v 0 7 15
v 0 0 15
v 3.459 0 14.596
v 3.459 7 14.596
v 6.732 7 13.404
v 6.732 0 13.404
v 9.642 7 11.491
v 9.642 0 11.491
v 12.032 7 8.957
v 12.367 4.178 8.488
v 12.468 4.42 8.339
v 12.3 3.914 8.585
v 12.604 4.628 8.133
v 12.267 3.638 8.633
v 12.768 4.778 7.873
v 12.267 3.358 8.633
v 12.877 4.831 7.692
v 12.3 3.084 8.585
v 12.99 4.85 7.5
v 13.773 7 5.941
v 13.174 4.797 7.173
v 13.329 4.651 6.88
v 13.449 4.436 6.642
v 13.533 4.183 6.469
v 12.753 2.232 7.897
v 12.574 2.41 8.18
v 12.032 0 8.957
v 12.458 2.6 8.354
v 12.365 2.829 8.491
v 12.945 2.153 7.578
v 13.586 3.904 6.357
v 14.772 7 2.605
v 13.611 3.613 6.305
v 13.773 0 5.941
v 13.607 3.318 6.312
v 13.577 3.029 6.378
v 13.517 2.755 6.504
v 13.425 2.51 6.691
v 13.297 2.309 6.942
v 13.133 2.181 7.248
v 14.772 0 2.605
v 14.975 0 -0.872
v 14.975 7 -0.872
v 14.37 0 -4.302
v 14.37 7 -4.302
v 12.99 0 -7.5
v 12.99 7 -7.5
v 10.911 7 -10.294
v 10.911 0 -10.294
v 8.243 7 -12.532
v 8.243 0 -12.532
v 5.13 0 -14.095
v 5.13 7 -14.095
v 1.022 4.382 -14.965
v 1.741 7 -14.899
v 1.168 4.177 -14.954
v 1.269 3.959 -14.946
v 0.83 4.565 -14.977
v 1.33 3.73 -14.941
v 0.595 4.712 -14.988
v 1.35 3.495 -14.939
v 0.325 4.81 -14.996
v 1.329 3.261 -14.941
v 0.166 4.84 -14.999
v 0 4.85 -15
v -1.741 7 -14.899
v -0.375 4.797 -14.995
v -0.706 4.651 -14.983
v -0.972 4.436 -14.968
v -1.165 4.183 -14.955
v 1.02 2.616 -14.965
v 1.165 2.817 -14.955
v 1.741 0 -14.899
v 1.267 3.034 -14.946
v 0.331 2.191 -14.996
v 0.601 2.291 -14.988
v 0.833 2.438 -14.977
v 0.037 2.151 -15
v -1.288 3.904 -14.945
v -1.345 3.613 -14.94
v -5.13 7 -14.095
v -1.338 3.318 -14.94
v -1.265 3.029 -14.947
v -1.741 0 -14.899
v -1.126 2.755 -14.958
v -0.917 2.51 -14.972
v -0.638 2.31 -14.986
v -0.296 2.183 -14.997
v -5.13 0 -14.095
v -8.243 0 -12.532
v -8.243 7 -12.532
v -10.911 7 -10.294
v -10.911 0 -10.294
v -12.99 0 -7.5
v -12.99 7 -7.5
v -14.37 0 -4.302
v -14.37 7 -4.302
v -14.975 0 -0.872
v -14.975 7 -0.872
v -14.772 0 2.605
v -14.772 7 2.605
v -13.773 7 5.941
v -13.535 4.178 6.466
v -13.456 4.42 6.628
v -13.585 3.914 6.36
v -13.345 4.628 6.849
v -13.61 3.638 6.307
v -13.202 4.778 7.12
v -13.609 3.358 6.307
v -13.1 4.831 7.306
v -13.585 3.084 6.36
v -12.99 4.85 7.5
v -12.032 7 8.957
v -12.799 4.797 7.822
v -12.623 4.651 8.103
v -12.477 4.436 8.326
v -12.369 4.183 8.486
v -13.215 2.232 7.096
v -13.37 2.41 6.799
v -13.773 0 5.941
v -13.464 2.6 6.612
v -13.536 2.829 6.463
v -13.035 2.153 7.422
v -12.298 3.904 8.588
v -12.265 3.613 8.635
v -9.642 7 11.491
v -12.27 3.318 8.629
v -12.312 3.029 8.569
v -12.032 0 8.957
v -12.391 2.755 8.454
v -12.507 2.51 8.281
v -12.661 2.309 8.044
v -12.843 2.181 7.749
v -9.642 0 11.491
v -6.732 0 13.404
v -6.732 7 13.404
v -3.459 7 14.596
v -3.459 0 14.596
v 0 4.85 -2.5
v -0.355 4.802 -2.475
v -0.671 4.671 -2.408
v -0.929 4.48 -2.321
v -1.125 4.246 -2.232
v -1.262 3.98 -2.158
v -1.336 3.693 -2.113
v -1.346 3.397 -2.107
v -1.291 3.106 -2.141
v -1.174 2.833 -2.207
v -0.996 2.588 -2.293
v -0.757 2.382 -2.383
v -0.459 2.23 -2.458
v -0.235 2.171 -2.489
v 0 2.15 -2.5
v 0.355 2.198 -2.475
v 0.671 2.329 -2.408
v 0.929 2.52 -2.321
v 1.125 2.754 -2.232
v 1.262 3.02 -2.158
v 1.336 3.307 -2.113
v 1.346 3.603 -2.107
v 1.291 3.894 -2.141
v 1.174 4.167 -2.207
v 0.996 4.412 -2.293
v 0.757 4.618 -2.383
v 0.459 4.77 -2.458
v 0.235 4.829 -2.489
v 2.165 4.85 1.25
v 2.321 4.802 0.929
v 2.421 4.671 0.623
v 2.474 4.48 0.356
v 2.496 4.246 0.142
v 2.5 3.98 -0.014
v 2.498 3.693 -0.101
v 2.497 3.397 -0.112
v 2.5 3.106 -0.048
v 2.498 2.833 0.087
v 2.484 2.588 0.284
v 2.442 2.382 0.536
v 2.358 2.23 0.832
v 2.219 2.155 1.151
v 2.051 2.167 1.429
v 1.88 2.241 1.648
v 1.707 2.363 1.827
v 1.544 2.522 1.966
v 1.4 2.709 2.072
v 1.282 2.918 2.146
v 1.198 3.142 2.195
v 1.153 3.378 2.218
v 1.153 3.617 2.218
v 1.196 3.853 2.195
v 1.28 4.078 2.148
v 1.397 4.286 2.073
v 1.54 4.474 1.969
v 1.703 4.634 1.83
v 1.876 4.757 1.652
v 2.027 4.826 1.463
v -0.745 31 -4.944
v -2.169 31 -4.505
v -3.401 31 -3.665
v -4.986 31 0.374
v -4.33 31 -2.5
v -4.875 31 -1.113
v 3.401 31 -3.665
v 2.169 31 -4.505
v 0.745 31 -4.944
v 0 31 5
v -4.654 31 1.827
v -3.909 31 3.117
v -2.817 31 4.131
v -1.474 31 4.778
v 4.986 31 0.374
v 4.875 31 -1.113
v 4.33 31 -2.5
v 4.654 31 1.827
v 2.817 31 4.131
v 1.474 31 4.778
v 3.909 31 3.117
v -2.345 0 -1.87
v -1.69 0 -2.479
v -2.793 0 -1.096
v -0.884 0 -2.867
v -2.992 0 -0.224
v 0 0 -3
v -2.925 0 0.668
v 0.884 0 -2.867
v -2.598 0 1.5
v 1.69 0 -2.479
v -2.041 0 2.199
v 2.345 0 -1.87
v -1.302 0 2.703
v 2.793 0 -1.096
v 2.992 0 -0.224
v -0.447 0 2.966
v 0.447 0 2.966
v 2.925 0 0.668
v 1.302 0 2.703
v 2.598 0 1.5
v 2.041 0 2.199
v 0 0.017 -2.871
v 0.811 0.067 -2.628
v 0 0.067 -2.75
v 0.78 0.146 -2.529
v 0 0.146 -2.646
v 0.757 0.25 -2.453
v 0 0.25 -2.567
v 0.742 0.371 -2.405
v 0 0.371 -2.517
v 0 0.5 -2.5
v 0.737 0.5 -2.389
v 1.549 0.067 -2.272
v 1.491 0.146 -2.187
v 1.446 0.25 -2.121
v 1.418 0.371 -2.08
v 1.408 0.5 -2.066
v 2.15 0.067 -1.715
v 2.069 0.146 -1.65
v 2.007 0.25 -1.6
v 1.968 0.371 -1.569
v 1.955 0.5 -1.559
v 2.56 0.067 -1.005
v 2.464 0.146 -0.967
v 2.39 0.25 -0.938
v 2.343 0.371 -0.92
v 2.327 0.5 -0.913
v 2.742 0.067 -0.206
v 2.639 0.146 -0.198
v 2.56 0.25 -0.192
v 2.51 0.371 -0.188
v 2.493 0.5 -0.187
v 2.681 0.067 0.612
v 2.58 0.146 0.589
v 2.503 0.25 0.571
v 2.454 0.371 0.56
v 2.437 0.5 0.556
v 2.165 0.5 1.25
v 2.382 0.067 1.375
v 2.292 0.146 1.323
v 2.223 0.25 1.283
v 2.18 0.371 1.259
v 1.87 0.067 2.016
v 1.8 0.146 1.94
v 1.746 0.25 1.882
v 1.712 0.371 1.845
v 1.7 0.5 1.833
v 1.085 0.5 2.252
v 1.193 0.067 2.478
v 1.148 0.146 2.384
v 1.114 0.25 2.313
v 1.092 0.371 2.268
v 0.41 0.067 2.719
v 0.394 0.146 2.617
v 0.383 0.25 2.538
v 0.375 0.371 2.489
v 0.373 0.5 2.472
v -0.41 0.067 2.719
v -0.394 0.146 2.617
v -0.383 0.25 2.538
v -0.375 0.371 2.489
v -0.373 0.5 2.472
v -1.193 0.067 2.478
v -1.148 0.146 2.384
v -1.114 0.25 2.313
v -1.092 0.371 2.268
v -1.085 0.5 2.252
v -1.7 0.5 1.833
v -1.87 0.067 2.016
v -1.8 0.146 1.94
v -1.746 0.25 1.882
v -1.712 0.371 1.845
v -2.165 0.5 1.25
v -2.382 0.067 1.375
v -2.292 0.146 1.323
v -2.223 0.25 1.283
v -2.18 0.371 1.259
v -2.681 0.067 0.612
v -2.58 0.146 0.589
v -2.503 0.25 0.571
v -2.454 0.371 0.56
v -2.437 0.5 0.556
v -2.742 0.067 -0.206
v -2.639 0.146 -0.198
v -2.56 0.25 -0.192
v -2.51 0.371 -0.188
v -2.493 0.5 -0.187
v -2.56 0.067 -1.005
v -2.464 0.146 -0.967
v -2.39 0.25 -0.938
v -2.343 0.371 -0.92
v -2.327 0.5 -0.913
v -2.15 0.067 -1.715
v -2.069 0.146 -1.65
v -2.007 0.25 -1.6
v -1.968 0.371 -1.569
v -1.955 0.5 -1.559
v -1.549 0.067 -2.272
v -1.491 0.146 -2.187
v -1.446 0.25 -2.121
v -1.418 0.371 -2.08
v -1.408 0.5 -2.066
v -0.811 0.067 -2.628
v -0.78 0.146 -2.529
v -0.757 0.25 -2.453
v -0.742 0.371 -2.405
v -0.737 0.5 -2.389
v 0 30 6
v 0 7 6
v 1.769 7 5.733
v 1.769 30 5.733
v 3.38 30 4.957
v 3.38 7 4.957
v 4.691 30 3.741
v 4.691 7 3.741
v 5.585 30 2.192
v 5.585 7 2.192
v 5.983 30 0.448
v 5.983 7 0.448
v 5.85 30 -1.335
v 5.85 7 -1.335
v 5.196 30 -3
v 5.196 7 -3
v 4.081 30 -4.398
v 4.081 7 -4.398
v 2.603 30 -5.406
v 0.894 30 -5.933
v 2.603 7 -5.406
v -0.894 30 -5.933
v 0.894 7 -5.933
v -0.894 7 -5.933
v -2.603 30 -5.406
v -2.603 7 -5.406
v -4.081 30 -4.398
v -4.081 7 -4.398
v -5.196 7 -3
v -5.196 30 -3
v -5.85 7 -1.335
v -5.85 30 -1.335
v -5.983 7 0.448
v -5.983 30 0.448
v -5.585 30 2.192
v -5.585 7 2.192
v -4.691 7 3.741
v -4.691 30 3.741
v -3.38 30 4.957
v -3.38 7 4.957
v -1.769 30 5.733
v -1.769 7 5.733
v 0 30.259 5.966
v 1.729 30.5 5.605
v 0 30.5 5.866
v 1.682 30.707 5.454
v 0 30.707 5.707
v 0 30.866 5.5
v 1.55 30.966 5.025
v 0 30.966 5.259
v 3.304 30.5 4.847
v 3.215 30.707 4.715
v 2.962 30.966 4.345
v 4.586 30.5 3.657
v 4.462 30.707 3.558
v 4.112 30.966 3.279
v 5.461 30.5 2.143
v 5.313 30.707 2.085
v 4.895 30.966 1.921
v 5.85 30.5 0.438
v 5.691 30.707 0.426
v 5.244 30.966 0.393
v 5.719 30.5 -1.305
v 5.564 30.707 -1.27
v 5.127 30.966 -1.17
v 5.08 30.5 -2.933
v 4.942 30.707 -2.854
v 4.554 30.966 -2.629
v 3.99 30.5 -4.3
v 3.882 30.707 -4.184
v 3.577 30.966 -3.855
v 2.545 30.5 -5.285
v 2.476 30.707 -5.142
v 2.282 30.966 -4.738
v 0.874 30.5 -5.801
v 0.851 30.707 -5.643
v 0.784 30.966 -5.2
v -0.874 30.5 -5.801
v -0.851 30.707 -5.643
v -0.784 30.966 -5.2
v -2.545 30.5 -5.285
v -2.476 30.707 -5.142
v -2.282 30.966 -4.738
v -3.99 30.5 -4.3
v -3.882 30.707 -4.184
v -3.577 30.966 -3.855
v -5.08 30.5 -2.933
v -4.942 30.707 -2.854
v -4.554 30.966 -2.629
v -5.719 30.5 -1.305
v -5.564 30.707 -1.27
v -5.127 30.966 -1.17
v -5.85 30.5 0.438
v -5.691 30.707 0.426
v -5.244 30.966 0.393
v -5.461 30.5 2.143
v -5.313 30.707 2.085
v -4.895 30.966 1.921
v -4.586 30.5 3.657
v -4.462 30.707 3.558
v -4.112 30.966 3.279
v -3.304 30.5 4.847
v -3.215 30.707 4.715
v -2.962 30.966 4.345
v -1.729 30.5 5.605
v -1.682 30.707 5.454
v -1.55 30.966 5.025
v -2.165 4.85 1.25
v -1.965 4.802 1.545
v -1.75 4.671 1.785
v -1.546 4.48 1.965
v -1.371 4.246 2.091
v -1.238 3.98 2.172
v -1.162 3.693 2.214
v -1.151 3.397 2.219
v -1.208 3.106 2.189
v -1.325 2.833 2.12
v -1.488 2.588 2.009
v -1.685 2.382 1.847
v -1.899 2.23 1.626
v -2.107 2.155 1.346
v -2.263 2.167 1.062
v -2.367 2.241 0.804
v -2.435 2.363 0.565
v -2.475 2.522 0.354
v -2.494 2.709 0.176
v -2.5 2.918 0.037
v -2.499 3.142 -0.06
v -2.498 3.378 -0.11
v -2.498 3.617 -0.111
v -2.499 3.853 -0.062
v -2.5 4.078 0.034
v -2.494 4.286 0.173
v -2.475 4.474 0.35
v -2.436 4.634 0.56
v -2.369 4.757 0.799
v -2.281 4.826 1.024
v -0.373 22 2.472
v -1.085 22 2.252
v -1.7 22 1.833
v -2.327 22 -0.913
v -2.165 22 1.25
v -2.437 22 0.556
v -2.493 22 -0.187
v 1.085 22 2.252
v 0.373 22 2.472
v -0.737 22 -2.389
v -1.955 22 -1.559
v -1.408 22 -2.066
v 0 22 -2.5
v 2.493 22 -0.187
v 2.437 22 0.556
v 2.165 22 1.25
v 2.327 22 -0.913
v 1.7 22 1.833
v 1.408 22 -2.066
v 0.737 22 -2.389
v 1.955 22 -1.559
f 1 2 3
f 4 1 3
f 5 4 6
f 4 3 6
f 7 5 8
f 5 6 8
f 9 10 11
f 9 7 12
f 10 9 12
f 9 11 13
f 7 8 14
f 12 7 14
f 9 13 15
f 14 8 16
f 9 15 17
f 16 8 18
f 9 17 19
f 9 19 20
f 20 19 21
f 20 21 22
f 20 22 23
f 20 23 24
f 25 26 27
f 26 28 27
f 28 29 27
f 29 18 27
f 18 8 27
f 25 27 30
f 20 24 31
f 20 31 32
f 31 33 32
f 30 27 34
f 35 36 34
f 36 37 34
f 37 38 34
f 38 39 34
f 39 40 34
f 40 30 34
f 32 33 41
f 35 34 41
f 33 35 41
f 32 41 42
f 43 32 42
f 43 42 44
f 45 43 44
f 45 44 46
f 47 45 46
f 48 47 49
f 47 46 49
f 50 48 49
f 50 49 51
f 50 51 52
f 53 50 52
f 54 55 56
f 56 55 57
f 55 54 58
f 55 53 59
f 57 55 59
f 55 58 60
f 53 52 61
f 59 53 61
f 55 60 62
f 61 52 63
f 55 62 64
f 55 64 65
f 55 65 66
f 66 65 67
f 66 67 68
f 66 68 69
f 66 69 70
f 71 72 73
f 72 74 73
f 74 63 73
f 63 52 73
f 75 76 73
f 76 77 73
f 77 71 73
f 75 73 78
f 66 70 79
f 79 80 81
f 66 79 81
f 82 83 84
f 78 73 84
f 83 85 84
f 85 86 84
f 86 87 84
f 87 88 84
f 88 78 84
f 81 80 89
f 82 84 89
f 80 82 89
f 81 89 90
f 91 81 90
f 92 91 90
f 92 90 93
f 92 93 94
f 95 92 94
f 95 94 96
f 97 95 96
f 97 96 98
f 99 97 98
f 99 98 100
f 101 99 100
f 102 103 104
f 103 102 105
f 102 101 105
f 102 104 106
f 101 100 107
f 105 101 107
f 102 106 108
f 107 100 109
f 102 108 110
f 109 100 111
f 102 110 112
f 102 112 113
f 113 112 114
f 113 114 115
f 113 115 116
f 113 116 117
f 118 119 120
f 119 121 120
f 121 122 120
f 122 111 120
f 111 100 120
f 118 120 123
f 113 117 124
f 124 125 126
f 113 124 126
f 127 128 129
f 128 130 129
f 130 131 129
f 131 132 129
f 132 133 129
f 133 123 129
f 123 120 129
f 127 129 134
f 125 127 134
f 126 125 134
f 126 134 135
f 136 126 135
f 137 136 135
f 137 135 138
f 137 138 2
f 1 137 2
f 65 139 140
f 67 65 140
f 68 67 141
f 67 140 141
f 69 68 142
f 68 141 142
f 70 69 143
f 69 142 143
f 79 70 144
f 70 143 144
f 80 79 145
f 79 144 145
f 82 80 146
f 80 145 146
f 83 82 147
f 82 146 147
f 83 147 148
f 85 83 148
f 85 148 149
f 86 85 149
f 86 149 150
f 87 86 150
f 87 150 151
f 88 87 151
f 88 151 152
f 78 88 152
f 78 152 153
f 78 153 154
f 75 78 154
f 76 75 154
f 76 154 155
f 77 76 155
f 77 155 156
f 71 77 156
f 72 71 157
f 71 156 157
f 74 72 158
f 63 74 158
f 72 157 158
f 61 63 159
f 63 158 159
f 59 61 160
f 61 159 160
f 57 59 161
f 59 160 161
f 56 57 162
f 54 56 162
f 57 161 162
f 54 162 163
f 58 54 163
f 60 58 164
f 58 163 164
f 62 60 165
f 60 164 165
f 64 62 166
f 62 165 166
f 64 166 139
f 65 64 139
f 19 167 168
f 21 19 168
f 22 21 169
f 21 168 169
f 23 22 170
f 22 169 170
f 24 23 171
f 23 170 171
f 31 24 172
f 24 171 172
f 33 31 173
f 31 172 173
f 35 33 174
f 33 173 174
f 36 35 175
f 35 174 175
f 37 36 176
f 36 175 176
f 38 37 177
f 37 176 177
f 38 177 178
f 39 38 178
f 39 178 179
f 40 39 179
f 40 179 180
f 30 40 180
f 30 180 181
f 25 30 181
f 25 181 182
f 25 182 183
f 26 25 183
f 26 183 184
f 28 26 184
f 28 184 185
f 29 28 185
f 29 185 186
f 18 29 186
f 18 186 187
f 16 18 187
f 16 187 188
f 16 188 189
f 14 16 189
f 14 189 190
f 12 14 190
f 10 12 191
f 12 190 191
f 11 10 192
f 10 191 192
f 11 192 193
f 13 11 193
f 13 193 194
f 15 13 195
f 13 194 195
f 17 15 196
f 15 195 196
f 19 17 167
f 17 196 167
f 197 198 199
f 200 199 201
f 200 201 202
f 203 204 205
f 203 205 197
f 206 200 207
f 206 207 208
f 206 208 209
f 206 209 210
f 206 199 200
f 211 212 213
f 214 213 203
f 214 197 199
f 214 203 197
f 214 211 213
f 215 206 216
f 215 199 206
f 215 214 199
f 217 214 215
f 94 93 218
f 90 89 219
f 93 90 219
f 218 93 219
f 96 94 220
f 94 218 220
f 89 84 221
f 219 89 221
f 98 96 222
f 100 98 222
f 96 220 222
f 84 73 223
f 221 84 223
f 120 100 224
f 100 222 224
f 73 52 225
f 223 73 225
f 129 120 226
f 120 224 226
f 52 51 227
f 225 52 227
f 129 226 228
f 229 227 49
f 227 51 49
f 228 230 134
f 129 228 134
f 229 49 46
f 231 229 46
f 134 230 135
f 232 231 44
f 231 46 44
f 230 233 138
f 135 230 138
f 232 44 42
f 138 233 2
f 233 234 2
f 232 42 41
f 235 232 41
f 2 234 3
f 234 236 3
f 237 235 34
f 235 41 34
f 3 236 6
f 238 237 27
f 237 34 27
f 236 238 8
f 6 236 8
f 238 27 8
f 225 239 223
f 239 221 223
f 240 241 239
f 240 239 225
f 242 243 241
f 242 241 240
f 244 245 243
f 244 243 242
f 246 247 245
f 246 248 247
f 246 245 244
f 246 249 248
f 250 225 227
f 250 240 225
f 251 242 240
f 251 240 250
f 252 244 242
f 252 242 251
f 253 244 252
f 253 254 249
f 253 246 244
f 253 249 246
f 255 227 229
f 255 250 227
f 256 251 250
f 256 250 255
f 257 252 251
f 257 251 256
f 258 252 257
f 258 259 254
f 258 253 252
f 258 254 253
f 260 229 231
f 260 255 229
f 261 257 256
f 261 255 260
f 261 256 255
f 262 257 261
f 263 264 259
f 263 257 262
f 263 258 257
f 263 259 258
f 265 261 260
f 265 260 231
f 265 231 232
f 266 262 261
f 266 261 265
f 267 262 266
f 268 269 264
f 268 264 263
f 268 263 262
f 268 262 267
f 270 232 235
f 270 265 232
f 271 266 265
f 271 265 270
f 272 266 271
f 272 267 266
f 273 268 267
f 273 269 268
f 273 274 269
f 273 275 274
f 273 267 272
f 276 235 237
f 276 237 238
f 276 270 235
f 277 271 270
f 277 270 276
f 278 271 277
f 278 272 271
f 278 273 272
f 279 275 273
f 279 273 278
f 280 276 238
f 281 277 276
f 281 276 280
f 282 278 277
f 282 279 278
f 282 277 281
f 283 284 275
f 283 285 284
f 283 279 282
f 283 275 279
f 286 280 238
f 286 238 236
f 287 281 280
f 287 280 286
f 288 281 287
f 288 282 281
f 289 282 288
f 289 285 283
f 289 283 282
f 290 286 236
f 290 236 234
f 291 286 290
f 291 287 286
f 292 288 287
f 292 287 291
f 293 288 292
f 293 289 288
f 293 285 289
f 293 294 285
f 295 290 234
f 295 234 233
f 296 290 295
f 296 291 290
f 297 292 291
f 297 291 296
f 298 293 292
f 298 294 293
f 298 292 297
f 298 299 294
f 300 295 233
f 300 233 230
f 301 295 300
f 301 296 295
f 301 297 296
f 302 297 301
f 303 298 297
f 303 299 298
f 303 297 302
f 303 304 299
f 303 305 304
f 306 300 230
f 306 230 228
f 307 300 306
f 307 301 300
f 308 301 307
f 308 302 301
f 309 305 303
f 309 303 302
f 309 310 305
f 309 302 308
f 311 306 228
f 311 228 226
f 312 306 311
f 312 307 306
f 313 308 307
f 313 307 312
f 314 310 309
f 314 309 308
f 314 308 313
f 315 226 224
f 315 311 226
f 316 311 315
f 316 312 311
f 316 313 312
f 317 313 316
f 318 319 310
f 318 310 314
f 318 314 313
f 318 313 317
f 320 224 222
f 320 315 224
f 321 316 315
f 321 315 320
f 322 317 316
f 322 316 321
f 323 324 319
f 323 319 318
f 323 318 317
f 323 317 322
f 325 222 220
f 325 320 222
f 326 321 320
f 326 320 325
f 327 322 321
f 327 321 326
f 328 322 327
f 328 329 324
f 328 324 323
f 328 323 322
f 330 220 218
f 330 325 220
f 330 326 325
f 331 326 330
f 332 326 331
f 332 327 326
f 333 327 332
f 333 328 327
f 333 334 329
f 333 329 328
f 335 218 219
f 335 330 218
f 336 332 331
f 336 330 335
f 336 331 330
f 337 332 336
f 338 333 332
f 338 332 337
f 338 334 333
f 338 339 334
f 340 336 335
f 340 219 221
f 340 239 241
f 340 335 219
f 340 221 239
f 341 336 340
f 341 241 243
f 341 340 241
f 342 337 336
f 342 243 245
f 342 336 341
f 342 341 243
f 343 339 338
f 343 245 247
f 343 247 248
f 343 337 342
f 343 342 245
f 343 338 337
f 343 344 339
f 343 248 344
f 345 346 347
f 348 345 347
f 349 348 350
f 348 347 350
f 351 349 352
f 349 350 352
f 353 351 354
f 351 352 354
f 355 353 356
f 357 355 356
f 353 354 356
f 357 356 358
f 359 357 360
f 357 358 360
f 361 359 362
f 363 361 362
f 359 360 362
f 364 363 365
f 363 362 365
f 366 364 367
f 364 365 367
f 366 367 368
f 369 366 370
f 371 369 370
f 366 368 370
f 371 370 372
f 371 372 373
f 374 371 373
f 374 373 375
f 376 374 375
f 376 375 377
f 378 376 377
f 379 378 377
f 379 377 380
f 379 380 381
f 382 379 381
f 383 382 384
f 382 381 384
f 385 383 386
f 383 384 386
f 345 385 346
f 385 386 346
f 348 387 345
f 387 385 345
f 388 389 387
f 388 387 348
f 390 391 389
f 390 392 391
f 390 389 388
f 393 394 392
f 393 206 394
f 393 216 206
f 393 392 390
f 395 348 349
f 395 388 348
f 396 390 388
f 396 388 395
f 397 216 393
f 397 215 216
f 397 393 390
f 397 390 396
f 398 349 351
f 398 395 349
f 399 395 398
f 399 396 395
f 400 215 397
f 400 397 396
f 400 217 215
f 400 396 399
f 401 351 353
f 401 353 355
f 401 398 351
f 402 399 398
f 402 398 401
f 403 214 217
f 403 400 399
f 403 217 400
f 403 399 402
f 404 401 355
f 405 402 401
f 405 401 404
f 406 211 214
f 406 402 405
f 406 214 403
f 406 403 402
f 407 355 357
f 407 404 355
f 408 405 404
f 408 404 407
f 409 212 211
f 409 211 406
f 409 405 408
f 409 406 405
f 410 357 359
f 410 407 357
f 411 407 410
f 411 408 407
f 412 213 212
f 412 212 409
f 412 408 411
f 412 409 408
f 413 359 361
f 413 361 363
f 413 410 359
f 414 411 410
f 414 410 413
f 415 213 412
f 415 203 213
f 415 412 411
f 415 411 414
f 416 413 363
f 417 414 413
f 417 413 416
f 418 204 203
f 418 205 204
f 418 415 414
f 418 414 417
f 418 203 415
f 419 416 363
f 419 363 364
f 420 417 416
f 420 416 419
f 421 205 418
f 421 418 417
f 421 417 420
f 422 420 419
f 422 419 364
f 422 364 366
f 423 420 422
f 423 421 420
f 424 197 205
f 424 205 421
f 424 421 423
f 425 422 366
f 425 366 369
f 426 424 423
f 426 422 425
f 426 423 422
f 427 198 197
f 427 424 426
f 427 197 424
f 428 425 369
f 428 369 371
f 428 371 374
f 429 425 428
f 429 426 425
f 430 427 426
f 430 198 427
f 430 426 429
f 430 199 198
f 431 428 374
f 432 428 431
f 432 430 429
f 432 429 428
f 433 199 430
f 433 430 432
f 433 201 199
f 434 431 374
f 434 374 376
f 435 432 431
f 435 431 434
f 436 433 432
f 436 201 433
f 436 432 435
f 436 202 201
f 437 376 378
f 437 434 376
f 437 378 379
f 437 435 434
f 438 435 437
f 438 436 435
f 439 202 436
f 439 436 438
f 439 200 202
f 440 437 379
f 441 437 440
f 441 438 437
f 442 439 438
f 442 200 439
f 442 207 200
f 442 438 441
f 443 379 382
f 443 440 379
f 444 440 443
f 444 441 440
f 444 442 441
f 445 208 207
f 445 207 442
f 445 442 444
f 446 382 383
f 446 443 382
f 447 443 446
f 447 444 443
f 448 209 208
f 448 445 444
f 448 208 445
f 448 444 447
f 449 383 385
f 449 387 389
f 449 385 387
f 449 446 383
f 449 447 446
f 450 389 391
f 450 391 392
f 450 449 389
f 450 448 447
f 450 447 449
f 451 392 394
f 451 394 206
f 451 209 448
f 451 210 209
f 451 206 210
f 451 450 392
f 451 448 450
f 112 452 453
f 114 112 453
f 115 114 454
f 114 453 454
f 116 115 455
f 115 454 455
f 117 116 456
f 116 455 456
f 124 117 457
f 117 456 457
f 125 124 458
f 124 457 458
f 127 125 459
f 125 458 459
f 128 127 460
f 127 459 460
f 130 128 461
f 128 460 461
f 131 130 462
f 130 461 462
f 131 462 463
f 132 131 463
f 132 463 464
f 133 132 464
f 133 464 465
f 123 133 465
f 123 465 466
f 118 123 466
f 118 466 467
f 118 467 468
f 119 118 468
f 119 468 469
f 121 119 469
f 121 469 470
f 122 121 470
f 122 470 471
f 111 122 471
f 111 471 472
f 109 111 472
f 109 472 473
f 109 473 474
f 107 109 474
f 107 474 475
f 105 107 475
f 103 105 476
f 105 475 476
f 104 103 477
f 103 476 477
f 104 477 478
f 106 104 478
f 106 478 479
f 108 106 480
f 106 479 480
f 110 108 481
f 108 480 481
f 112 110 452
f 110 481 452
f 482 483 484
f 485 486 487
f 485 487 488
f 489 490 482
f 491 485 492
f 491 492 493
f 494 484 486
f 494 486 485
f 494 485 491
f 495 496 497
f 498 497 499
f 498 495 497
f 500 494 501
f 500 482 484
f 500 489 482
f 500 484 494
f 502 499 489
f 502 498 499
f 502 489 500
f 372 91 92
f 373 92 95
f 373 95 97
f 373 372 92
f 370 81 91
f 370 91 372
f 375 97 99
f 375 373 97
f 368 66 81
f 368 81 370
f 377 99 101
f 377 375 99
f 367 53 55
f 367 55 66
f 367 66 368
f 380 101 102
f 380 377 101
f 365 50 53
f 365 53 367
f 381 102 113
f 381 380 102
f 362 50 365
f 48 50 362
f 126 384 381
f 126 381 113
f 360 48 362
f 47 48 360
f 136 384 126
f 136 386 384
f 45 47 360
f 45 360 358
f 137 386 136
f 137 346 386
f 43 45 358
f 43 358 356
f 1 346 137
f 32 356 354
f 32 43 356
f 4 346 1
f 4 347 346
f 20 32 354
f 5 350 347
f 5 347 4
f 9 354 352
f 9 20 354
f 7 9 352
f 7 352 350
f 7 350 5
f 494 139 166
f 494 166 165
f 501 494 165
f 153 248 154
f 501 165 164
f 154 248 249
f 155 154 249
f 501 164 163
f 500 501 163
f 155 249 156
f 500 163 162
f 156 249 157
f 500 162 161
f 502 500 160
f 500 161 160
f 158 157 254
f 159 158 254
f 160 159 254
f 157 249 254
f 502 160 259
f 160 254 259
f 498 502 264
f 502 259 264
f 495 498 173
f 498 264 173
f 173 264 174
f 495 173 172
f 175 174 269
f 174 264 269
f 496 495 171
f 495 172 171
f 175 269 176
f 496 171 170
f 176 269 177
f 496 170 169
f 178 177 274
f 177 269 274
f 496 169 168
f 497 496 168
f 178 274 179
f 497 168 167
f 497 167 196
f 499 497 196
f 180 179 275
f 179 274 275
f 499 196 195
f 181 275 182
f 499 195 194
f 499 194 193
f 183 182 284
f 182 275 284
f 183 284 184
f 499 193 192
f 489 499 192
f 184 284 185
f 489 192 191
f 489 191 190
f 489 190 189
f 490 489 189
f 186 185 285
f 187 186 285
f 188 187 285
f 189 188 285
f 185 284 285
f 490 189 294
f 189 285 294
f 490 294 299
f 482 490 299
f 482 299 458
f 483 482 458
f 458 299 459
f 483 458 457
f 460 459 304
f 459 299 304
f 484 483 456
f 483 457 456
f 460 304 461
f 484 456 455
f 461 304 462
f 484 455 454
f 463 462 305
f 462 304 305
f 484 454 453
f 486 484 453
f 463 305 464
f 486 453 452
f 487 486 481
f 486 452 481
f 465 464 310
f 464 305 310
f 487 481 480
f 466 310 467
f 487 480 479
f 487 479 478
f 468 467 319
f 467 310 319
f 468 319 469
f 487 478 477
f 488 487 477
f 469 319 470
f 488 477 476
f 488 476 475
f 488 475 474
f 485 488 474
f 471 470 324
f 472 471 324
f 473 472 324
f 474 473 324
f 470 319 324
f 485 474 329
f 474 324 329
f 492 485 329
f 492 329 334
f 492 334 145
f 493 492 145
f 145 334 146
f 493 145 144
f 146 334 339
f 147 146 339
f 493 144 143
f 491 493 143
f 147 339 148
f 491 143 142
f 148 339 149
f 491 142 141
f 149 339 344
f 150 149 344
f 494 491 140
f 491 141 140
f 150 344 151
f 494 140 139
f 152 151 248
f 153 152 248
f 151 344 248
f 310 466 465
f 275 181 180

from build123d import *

# Parameters (mm, degrees)
SKICA1_R                 = 15
P_IDAT_VYSUNUT_M1_DEPTH  = 7
SKICA3_R                 = 6
P_IDAT_VYSUNUT_M2_DEPTH  = 24
ZAOBLIT1_R               = 1
SKICA5_R                 = 2.5
ODEBRAT_VYSUNUT_M1_DEPTH = 22
ZAOBLIT3_R               = 0.5
SKICA6_R                 = 1.35
ODEBRAT_VYSUNUT_M3_DEPTH = 38.563280025
KRUHOV_POLE1_COUNT       = 3


with BuildPart() as part:
    # Skica1 → Přidat vysunutím1 (new body)
    with BuildSketch(Plane(origin=(0, 0, 0), x_dir=(1, 0, 0), z_dir=(0, 1, 0))):
        with Locations(Location((0, 0, 0), (0, 0, 270))):
            Circle(SKICA1_R)
    extrude(amount=P_IDAT_VYSUNUT_M1_DEPTH)

    # Skica3 → Přidat vysunutím2 (add)
    with BuildSketch(Plane(origin=(0, 7, 0), x_dir=(1, 0, 0), z_dir=(0, 1, 0))):
        with Locations(Location((0, 0, 0), (0, 0, 270))):
            Circle(SKICA3_R)
    extrude(amount=P_IDAT_VYSUNUT_M2_DEPTH)

    # Zaoblit1
    zaoblit1_edges = [part.edges().sort_by_distance(p)[0] for p in [
        (0, 31, -6),
    ]]
    fillet(zaoblit1_edges, radius=ZAOBLIT1_R)

    # Skica5 → Odebrat vysunutím1 (cut)
    with BuildSketch(Plane.XZ):
        with Locations(Location((0, 0, 0), (0, 0, 270))):
            Circle(SKICA5_R)
    extrude(amount=-ODEBRAT_VYSUNUT_M1_DEPTH, mode=Mode.SUBTRACT)

    # Zaoblit3
    zaoblit3_edges = [part.edges().sort_by_distance(p)[0] for p in [
        (0, 0, 2.5),
    ]]
    fillet(zaoblit3_edges, radius=ZAOBLIT3_R)

    # Skica6 → Odebrat vysunutím3 (cut, through all)
    with BuildSketch(Plane.XY):
        with Locations(Location((0, 3.5, 0), (0, 0, 90))):
            Circle(SKICA6_R)
    odebrat_vysunut_m3 = extrude(amount=-ODEBRAT_VYSUNUT_M3_DEPTH, mode=Mode.SUBTRACT)

    # Kruhové pole1: Odebrat vysunutím3 ×3 about axis
    kruhov_pole1_axis = Axis((0, 0, 0), (0, -1, 0))
    for i in range(1, KRUHOV_POLE1_COUNT):
        add(odebrat_vysunut_m3.rotate(kruhov_pole1_axis, i * 360 / KRUHOV_POLE1_COUNT), mode=Mode.SUBTRACT)


solid = part.part
